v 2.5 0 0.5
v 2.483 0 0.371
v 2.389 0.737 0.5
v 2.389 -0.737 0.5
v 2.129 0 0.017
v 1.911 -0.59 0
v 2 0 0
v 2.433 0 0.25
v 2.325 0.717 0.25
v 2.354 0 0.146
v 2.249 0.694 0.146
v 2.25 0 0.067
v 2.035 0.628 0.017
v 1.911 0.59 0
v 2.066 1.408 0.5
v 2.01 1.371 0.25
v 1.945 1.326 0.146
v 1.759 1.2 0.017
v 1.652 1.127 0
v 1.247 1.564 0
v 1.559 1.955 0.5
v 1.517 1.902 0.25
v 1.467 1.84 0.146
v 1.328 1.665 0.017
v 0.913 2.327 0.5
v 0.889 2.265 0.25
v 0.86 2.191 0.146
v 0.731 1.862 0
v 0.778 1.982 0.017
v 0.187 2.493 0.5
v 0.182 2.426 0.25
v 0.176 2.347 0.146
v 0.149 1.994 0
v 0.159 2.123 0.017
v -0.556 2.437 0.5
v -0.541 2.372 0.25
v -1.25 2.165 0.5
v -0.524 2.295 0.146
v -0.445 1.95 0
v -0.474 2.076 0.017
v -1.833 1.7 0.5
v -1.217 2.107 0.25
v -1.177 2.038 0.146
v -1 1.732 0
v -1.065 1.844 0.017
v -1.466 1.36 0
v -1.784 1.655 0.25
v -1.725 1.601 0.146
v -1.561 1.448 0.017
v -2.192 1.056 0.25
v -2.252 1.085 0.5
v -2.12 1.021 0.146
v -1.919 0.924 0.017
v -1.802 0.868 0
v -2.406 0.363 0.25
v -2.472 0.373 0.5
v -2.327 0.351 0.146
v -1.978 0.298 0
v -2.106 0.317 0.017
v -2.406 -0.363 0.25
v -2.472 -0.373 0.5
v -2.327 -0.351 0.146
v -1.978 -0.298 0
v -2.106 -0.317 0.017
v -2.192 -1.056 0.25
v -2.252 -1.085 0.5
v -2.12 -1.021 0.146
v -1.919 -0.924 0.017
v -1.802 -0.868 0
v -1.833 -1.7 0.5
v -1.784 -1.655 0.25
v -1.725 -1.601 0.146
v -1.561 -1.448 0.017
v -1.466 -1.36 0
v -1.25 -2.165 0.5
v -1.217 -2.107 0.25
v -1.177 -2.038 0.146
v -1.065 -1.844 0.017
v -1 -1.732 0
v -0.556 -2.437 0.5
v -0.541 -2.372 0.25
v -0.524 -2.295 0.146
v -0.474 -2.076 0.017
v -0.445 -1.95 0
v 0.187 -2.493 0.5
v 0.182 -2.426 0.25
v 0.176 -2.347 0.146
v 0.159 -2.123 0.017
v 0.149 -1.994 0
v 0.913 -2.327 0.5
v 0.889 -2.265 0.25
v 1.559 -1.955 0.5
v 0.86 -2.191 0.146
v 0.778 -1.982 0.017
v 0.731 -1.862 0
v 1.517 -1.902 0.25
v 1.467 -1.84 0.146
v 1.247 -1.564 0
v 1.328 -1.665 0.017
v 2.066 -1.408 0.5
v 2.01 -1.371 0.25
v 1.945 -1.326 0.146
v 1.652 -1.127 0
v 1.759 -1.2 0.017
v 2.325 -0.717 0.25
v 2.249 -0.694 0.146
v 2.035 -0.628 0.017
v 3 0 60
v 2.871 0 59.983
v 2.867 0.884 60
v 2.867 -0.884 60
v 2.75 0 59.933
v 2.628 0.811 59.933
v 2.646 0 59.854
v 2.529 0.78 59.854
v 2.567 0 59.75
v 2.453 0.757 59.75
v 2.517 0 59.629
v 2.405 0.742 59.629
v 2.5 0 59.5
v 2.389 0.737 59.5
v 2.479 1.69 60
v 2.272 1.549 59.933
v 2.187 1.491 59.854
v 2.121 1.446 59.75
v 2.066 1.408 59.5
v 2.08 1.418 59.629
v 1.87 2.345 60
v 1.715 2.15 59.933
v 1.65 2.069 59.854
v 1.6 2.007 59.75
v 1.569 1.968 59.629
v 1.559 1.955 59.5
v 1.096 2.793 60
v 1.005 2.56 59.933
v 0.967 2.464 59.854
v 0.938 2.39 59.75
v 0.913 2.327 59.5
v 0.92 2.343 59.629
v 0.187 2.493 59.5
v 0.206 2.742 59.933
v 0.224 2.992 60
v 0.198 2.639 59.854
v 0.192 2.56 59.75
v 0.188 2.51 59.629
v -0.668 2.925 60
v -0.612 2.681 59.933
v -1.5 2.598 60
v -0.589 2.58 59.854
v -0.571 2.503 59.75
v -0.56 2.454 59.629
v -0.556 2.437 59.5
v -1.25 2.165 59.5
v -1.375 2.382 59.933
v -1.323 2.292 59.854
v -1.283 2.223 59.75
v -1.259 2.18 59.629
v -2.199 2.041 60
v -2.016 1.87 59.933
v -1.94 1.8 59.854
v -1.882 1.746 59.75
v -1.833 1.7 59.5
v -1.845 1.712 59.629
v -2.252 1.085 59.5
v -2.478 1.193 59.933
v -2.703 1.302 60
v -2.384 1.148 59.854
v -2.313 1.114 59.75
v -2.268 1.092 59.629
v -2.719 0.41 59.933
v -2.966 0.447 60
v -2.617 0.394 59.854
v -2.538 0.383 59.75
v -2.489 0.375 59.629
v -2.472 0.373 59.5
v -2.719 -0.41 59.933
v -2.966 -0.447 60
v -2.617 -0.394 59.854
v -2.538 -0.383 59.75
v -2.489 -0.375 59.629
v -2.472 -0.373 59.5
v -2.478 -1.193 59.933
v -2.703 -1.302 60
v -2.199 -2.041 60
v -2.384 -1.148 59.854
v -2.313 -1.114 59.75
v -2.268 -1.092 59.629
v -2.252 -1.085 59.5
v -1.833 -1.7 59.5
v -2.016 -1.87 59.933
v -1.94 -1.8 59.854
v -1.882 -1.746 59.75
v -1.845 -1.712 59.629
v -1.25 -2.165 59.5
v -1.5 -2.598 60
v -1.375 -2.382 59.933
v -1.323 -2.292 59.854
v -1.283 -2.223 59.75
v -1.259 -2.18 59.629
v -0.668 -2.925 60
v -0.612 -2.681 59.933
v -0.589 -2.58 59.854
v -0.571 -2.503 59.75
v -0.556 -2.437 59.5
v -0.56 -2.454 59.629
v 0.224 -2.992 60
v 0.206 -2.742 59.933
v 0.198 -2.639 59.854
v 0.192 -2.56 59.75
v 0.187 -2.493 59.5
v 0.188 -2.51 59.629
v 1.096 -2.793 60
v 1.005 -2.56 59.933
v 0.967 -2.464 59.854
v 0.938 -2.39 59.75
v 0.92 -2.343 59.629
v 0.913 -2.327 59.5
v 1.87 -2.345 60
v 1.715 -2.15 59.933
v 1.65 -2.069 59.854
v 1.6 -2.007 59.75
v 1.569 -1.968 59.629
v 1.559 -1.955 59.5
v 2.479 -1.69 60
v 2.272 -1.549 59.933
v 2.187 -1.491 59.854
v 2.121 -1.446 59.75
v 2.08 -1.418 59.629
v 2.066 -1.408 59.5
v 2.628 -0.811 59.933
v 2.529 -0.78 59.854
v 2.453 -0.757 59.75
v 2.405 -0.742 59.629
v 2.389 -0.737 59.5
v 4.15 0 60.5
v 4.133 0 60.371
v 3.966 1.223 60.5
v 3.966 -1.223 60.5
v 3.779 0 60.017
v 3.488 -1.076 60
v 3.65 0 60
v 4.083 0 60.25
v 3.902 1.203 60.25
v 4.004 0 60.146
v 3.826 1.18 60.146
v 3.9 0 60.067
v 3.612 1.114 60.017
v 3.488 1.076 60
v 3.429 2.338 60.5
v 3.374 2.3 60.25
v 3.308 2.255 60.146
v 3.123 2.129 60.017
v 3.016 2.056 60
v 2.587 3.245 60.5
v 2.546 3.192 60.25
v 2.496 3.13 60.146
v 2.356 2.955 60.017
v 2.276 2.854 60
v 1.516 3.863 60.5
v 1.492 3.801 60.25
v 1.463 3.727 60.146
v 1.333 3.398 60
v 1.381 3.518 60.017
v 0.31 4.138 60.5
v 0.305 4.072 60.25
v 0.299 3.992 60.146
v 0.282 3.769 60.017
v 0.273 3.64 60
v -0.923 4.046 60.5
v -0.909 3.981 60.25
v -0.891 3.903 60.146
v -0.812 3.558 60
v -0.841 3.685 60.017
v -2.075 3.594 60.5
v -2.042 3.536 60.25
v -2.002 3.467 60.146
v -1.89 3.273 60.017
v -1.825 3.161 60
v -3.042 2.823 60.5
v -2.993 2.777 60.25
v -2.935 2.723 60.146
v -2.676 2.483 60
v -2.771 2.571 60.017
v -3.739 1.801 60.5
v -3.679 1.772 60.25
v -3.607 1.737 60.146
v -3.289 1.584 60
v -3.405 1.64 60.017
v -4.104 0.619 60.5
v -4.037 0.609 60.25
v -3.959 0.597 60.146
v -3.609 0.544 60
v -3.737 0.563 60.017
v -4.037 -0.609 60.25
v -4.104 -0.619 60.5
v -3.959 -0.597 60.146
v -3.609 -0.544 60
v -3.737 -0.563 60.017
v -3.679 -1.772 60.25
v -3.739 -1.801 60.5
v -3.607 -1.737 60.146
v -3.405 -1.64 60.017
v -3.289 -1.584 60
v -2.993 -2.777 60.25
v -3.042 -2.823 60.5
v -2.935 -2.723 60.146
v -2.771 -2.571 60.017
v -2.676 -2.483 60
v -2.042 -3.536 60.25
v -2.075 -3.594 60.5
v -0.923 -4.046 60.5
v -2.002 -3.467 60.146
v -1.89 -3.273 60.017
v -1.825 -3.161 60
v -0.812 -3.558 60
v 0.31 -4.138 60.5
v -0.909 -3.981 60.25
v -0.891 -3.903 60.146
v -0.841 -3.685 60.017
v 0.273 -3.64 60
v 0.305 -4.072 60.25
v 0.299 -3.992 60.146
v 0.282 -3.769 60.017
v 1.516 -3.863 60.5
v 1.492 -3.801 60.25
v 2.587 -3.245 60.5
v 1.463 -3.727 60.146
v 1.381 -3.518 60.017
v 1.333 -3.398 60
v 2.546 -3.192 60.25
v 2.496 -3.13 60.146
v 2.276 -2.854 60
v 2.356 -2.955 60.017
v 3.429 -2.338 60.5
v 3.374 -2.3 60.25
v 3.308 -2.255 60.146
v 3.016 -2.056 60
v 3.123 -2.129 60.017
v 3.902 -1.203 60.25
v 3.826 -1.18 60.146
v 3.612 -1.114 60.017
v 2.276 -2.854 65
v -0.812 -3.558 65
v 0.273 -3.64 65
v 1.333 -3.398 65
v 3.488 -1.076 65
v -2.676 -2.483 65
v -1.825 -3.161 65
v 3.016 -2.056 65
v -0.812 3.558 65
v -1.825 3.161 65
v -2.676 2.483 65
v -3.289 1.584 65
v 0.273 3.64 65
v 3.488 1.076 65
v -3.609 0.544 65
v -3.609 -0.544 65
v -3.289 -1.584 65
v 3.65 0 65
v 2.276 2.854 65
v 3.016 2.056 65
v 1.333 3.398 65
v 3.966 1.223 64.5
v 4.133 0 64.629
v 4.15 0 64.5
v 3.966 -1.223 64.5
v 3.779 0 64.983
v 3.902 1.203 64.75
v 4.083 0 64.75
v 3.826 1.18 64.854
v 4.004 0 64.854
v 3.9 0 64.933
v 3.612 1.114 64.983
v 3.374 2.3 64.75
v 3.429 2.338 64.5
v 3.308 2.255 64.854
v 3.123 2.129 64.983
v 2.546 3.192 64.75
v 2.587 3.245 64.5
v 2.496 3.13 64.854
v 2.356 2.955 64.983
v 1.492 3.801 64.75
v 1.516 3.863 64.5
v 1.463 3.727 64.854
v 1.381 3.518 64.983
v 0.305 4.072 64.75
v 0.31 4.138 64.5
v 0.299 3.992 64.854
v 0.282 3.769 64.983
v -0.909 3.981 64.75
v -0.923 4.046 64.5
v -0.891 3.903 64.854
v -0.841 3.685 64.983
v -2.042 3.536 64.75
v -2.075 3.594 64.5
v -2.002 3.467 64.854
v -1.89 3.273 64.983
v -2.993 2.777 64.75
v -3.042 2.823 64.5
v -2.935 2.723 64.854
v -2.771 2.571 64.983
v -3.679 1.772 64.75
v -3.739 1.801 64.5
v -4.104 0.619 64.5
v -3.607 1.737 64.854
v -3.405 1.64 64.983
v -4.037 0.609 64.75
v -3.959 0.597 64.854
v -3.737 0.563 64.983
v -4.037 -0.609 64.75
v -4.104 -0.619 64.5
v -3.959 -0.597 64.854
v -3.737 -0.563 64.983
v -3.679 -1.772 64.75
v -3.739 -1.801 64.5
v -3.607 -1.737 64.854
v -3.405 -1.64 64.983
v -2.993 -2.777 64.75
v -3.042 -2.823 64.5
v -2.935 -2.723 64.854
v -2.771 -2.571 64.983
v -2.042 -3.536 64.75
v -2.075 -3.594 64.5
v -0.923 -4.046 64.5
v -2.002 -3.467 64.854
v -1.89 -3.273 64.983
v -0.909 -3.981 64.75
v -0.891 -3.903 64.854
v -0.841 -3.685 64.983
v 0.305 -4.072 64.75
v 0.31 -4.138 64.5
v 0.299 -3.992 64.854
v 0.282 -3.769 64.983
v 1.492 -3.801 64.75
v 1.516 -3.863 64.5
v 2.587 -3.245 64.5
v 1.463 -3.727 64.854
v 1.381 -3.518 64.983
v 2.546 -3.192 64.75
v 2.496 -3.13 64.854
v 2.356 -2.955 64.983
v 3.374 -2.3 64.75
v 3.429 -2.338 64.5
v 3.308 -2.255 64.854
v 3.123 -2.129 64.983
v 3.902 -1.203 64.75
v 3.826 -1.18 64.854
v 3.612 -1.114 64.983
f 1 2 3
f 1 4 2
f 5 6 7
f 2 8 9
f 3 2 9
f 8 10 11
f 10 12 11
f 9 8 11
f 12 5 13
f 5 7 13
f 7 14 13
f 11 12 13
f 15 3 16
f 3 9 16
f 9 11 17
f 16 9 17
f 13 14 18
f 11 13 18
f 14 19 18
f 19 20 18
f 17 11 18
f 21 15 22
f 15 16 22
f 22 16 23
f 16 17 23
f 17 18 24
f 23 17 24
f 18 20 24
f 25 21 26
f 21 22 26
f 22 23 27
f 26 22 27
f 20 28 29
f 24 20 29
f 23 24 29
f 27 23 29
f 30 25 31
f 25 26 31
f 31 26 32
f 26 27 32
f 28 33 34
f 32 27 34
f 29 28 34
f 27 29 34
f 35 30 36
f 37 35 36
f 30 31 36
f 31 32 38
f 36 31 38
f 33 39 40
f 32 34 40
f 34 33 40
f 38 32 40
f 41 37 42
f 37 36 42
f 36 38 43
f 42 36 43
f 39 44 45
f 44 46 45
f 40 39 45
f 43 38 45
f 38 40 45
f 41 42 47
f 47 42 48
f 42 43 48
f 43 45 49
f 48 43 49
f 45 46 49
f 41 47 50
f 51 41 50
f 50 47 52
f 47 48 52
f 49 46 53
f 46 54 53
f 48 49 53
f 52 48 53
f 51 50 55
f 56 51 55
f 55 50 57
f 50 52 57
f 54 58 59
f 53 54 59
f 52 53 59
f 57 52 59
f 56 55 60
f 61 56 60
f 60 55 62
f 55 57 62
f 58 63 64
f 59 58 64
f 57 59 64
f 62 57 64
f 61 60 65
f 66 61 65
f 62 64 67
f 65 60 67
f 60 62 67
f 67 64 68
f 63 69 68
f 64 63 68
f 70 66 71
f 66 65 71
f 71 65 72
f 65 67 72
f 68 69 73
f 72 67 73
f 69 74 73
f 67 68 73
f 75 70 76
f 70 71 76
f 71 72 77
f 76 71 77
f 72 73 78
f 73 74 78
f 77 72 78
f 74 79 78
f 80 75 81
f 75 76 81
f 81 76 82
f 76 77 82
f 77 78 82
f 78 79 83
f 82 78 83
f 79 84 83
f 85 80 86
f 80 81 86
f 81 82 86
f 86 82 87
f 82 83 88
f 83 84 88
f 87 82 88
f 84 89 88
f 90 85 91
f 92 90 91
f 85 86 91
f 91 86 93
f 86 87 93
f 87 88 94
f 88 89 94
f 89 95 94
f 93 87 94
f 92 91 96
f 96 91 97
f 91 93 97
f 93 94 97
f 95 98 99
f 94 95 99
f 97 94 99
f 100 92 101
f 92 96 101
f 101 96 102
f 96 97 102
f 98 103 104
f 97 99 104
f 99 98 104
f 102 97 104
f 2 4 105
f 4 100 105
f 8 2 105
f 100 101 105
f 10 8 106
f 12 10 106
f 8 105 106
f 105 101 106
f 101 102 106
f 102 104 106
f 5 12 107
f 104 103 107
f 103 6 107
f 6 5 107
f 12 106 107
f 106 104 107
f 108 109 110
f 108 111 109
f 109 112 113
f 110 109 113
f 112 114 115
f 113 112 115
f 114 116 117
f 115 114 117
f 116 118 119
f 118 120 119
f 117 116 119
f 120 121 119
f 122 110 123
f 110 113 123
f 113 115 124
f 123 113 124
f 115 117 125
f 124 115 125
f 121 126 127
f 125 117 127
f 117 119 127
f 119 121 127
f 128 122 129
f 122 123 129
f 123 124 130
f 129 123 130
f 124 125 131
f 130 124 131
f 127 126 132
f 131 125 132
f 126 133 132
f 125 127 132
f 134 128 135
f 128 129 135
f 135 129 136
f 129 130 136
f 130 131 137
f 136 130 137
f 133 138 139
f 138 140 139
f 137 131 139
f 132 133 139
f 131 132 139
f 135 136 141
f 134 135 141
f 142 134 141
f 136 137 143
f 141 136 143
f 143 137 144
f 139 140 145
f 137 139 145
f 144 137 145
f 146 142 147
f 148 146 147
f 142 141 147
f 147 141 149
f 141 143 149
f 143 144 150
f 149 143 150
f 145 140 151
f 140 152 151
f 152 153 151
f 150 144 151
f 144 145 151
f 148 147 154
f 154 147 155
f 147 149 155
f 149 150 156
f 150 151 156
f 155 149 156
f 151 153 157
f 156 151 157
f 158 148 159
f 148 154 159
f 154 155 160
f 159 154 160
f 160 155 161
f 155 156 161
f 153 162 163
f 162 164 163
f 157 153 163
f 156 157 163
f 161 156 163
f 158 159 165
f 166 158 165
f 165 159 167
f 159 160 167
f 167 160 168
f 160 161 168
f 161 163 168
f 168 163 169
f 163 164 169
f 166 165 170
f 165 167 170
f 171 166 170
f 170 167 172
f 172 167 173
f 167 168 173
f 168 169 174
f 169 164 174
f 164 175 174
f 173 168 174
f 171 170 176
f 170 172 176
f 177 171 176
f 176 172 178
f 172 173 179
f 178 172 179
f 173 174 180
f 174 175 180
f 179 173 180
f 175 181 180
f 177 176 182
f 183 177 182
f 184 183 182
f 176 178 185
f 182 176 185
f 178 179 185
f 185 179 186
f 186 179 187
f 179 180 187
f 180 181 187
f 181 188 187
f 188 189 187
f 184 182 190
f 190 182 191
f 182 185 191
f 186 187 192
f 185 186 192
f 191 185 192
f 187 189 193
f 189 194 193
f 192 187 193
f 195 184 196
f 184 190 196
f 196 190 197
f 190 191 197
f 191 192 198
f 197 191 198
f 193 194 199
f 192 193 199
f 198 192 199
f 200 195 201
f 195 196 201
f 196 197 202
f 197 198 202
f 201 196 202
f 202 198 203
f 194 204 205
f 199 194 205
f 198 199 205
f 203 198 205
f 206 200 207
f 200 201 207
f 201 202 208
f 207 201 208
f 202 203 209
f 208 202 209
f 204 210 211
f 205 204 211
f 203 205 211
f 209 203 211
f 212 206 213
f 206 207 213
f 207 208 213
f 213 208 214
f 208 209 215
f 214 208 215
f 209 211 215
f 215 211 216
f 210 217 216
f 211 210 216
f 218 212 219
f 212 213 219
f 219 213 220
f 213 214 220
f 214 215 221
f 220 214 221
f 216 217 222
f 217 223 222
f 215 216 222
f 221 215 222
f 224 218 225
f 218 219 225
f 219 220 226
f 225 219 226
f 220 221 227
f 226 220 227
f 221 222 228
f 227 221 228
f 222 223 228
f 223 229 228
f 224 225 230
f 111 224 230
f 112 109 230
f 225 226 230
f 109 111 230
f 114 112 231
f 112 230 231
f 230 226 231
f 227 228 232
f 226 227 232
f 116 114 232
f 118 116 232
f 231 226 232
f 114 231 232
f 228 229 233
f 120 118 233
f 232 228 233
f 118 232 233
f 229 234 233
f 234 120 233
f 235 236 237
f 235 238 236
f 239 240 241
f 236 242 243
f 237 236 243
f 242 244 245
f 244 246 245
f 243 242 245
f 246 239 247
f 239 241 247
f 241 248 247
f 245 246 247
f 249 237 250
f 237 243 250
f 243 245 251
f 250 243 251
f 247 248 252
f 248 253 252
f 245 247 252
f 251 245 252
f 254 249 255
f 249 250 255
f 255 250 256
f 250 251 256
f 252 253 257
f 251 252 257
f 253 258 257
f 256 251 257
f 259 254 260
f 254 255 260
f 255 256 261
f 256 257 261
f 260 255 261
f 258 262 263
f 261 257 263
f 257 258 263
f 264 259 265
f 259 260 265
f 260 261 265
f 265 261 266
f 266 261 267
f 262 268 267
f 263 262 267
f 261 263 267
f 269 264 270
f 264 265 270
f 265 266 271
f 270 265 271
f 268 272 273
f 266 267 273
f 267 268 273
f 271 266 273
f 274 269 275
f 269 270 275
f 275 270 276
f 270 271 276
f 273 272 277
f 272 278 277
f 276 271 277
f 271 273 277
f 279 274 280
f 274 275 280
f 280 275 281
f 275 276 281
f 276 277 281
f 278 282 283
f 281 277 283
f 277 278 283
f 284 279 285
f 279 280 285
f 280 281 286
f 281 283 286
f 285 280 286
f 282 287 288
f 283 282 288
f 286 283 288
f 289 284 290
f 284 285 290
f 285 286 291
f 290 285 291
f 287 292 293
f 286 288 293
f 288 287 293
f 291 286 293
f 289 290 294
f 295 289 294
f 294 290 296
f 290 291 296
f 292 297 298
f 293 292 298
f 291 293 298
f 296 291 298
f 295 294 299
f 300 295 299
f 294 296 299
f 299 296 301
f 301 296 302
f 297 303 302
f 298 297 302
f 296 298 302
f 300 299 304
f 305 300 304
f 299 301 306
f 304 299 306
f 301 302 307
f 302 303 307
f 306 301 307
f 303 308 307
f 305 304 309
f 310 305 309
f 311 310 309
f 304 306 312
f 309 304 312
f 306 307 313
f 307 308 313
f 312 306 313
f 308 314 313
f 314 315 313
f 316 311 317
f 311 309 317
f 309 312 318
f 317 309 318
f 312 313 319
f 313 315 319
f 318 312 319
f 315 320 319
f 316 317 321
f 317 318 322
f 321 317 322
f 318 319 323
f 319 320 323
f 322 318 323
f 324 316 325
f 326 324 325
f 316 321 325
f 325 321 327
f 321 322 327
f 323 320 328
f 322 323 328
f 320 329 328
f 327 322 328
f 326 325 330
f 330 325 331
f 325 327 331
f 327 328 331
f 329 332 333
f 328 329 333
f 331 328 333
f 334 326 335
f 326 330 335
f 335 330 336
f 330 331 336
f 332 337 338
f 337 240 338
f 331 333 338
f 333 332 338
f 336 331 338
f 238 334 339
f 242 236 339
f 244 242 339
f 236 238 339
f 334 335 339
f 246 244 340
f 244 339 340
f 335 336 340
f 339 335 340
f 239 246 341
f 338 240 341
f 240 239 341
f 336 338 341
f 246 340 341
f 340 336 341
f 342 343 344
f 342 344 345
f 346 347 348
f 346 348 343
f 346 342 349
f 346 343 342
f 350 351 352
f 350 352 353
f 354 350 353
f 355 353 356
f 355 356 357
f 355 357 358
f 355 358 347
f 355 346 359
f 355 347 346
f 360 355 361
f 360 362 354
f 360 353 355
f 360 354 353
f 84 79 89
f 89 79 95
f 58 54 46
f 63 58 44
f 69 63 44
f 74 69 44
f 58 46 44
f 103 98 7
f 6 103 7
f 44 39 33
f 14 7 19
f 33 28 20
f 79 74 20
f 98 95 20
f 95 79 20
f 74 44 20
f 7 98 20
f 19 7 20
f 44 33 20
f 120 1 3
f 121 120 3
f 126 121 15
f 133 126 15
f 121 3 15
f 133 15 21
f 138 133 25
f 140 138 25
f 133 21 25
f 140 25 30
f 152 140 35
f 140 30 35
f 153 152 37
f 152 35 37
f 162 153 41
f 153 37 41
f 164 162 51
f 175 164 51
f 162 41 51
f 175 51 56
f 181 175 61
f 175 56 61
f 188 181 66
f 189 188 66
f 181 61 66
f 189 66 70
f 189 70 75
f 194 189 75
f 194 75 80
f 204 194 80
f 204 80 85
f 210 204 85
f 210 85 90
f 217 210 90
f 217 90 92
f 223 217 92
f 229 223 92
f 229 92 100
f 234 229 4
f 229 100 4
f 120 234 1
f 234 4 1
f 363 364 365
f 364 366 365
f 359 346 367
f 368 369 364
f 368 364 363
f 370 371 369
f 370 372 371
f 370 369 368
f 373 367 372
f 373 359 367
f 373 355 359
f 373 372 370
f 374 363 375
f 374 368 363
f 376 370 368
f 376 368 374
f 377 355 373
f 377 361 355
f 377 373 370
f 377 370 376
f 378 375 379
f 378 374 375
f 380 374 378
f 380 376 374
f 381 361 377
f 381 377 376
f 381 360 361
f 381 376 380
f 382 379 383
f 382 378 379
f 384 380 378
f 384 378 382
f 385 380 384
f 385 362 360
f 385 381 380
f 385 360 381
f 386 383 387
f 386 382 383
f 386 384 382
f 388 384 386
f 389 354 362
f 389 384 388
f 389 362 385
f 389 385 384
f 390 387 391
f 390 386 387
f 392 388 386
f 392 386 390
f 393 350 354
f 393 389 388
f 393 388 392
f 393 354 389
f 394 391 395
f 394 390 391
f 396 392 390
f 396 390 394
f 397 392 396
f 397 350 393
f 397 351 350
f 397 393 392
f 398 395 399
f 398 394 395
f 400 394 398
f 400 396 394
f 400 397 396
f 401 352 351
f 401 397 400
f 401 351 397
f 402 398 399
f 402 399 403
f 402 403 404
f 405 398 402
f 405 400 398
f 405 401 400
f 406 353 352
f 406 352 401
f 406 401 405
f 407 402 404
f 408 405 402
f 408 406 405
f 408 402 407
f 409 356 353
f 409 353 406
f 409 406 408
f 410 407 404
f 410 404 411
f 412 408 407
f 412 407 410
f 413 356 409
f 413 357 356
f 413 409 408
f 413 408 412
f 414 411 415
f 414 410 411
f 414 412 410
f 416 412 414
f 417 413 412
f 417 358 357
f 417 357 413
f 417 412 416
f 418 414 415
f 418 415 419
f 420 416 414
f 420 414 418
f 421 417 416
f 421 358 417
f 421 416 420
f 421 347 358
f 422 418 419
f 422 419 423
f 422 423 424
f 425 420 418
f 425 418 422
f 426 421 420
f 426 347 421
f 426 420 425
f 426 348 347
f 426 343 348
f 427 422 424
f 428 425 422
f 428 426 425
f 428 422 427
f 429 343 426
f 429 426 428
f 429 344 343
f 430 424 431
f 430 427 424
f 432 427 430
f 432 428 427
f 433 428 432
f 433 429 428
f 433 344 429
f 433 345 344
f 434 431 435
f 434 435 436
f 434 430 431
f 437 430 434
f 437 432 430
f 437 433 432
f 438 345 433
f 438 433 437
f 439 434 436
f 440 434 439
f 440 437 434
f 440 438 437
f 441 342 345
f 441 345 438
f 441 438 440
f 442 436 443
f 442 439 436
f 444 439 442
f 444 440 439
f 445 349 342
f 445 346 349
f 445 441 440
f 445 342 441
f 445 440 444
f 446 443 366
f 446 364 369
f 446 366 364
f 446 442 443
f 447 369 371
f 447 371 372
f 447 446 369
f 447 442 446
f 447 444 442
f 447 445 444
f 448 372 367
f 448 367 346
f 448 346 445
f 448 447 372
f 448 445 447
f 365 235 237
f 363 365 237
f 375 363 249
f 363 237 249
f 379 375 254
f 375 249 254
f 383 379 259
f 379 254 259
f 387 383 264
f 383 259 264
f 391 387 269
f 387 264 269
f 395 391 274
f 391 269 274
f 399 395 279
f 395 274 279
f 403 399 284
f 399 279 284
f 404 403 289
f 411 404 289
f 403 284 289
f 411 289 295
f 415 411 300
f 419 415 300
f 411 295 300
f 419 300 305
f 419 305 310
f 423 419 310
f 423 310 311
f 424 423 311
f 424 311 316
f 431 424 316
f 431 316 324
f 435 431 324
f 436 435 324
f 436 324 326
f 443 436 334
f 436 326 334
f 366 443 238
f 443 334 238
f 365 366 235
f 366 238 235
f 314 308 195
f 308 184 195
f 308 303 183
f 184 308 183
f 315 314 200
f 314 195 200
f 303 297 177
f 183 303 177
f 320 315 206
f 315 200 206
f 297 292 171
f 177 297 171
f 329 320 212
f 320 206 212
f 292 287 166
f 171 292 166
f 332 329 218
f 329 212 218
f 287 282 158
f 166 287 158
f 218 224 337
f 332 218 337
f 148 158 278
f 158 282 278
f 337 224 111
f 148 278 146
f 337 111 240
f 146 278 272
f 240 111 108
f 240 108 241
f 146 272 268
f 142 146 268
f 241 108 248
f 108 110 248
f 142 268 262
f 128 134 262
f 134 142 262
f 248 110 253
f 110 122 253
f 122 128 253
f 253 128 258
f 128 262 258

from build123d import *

# Parameters (mm, degrees)
SKETCH1_R           = 2.5
BOSS_EXTRUDE1_DEPTH = 60
SKETCH2_R           = 4.15
BOSS_EXTRUDE2_DEPTH = 5
FILLET1_R           = 0.5


with BuildPart() as part:
    # Sketch1 → Boss-Extrude1 (new body)
    with BuildSketch(Plane.XY):
        Circle(SKETCH1_R)
    extrude(amount=BOSS_EXTRUDE1_DEPTH)

    # Sketch2 → Boss-Extrude2 (add)
    with BuildSketch(Plane.XY.offset(60)):
        Circle(SKETCH2_R)
    extrude(amount=BOSS_EXTRUDE2_DEPTH)

    # Fillet1
    fillet1_edges = [part.edges().sort_by_distance(p)[0] for p in [
        (-2.5, 0, 0),
        (-2.5, 0, 60),
        (-4.15, 0, 60),
        (-4.15, 0, 65),
    ]]
    fillet(fillet1_edges, radius=FILLET1_R)


solid = part.part
